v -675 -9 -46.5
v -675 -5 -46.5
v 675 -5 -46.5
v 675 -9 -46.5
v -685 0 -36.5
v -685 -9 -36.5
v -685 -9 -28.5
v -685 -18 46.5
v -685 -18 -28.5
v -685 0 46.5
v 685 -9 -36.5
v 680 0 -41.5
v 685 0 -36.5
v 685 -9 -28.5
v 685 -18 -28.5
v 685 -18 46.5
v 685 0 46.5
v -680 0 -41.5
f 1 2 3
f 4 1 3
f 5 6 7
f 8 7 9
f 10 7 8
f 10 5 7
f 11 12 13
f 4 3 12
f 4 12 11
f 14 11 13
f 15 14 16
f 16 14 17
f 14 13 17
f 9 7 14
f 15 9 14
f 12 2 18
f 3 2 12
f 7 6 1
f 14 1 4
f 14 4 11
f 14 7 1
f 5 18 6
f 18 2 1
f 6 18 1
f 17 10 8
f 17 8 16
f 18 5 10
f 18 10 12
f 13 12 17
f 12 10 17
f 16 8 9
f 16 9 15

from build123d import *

# Parameters (mm, degrees)
F0_W     = 1370
F0_H     = 93
F1_DEPTH = 9
F2_W     = 1370
F2_H     = 75
F3_DEPTH = 9
F4_SIZE  = 10
F5_SIZE  = 5


with BuildPart() as f1:
    # F0 (on Front) → F1 (new body)
    with BuildSketch(Plane.XZ):
        Rectangle(F0_W, F0_H)
    extrude(amount=F1_DEPTH)

    # F2 (on face) → F3 (join)
    with BuildSketch(Plane.XZ.offset(9)):
        with Locations((0, 9)):
            Rectangle(F2_W, F2_H)
    extrude(amount=F3_DEPTH)

    # F4
    f4_edges = [f1.edges().sort_by_distance(p)[0] for p in [
        (685, -4.5, -46.5),
        (-685, -4.5, -46.5),
    ]]
    chamfer(f4_edges, length=F4_SIZE)

    # F5
    f5_edges = [f1.edges().sort_by_distance(p)[0] for p in [
        (0, 0, -46.5),
    ]]
    chamfer(f5_edges, length=F5_SIZE)


solid = f1.part
